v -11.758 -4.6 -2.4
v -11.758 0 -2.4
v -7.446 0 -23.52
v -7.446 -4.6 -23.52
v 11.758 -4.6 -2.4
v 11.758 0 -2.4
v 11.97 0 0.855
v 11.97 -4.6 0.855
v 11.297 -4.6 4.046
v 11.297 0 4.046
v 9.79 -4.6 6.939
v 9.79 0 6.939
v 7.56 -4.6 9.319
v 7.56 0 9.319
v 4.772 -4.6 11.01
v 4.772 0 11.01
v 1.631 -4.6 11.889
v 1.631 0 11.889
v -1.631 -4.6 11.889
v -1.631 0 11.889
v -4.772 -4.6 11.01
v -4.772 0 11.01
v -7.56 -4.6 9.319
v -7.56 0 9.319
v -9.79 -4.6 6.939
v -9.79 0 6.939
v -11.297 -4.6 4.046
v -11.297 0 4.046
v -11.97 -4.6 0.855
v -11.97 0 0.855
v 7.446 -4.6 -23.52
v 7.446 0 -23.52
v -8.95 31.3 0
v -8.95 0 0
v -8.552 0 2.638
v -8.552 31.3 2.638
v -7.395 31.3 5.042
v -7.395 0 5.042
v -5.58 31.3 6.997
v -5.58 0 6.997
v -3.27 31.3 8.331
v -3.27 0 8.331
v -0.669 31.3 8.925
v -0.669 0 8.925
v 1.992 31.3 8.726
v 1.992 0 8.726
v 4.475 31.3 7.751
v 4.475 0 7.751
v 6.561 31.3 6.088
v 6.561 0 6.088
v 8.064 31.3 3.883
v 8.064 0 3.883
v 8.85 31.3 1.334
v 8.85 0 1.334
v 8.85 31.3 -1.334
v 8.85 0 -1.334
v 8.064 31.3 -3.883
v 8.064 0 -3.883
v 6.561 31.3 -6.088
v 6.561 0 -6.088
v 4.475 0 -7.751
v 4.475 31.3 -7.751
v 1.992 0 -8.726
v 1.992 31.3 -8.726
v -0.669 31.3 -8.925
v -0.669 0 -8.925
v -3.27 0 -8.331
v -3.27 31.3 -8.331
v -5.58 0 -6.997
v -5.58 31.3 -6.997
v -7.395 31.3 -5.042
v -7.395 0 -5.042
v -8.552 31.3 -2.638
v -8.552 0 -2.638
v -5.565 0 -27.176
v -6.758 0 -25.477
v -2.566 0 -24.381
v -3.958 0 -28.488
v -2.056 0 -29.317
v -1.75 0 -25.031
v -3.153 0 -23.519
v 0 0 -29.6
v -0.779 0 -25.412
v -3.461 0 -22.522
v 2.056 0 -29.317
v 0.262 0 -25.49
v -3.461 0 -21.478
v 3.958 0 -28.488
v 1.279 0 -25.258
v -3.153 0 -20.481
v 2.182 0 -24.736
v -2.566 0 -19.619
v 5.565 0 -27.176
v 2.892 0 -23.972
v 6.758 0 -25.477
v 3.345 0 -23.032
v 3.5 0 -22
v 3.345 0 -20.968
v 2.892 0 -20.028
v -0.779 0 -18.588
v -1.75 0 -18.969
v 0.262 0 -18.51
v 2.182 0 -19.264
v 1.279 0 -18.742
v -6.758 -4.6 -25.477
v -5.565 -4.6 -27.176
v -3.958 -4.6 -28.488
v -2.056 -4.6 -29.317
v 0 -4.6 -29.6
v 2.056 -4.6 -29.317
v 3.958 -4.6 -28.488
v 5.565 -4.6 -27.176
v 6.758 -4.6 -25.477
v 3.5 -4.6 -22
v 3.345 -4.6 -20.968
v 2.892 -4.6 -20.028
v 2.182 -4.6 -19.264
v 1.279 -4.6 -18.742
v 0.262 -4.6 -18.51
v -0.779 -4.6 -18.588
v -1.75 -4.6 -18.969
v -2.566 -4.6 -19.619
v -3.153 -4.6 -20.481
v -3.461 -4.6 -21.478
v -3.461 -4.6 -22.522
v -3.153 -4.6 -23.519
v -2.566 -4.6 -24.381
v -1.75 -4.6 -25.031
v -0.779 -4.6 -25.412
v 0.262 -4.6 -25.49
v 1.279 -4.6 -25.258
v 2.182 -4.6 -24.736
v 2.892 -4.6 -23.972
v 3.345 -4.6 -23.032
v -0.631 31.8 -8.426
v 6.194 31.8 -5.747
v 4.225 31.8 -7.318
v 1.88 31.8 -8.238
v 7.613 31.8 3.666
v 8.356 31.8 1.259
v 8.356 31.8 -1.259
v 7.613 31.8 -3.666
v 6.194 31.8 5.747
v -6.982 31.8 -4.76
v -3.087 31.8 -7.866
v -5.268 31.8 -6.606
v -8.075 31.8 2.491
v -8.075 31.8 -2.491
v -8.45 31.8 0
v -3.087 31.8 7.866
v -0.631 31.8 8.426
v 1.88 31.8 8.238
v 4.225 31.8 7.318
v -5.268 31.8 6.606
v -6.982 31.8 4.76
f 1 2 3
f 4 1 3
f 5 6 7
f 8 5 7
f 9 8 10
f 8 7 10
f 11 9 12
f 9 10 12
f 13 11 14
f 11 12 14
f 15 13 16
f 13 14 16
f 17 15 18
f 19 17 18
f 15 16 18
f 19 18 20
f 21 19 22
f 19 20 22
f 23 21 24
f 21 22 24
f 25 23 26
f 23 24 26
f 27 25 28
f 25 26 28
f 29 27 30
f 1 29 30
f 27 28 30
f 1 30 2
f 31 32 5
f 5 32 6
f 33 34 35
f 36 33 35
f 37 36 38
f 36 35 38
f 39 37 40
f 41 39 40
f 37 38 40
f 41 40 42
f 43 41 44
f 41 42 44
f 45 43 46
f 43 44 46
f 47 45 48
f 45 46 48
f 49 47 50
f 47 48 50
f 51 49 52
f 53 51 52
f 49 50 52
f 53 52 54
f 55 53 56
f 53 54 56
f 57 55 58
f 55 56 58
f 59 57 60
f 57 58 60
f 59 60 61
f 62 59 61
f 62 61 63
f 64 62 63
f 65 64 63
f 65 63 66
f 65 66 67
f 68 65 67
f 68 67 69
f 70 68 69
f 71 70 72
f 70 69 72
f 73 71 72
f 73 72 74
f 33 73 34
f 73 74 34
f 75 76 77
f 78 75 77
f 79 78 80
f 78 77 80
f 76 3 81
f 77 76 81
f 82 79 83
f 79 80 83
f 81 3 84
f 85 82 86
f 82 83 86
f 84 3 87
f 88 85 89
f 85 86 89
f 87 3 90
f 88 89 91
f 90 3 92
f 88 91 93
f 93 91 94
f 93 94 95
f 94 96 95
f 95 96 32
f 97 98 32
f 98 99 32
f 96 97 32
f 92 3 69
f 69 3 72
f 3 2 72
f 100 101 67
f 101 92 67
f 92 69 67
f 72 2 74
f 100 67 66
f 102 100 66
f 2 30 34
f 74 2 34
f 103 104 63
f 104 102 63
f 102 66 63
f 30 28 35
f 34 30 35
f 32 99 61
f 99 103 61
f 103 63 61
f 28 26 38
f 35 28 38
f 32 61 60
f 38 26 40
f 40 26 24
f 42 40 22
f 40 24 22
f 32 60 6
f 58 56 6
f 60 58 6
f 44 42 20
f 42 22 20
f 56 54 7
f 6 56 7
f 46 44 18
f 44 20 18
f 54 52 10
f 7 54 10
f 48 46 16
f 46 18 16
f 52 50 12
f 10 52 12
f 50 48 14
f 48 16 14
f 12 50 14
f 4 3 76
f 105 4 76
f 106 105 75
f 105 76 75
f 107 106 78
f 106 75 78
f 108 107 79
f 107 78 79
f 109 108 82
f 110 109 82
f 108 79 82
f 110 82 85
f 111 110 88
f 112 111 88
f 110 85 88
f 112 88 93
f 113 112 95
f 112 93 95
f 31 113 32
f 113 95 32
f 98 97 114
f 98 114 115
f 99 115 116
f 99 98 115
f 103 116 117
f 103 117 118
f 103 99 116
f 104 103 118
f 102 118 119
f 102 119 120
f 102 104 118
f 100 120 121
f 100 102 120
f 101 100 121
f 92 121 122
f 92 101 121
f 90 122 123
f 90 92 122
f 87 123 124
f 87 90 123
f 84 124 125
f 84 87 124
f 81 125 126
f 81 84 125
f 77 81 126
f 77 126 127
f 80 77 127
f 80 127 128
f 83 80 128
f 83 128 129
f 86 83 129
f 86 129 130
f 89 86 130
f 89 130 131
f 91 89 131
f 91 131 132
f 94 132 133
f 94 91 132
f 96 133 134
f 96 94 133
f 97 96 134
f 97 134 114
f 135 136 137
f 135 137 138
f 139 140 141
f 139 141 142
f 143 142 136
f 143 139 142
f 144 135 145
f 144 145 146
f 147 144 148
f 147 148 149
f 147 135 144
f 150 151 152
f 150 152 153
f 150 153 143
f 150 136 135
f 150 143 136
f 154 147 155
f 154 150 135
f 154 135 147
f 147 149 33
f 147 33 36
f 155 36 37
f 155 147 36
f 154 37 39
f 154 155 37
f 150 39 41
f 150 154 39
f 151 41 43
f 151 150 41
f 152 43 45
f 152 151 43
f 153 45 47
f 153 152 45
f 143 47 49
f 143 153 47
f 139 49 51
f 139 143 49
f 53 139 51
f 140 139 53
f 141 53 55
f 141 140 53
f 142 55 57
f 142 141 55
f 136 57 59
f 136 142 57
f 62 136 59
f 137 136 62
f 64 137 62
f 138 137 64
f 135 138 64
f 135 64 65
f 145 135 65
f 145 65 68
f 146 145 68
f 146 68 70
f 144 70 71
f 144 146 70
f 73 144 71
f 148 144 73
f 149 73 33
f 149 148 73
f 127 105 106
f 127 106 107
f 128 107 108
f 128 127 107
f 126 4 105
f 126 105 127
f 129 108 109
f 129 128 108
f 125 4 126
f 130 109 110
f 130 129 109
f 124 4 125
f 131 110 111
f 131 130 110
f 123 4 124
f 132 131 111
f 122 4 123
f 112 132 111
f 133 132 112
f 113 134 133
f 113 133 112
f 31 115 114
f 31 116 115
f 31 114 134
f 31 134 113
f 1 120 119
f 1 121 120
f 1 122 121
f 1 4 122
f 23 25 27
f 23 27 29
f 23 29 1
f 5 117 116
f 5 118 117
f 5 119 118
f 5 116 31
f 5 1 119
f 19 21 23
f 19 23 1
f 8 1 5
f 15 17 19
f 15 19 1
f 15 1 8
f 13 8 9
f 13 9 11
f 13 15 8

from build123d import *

# Parameters (mm, degrees)
F0_R     = 3.5
F1_DEPTH = 4.6
F2_R     = 8.95
F3_DEPTH = 31.8
F4_SIZE  = 0.5


with BuildPart() as f1:
    # F0 (on Front) → F1 (new body)
    with BuildSketch(Plane.XZ):
        with BuildLine():
            Line((7.446449, -23.52), (11.757551, -2.4))
            ThreePointArc((11.757551, -2.4), (0, 12), (-11.757551, -2.4))
            Line((-11.757551, -2.4), (-7.446449, -23.52))
            ThreePointArc((-7.446449, -23.52), (0, -29.6), (7.446449, -23.52))
        make_face()
        with Locations((0, -22)):
            Circle(F0_R, mode=Mode.SUBTRACT)
    extrude(amount=F1_DEPTH)

    # F2 (on face) → F3 (join)
    with BuildSketch(Plane(origin=(0, 0, 0), x_dir=(-1, 0, 0), z_dir=(0, 1, 0))):
        Circle(F2_R)
    extrude(amount=F3_DEPTH)

    # F4
    f4_edges = [f1.edges().sort_by_distance(p)[0] for p in [
        (8.95, 31.8, 0),
    ]]
    chamfer(f4_edges, length=F4_SIZE)


solid = f1.part
